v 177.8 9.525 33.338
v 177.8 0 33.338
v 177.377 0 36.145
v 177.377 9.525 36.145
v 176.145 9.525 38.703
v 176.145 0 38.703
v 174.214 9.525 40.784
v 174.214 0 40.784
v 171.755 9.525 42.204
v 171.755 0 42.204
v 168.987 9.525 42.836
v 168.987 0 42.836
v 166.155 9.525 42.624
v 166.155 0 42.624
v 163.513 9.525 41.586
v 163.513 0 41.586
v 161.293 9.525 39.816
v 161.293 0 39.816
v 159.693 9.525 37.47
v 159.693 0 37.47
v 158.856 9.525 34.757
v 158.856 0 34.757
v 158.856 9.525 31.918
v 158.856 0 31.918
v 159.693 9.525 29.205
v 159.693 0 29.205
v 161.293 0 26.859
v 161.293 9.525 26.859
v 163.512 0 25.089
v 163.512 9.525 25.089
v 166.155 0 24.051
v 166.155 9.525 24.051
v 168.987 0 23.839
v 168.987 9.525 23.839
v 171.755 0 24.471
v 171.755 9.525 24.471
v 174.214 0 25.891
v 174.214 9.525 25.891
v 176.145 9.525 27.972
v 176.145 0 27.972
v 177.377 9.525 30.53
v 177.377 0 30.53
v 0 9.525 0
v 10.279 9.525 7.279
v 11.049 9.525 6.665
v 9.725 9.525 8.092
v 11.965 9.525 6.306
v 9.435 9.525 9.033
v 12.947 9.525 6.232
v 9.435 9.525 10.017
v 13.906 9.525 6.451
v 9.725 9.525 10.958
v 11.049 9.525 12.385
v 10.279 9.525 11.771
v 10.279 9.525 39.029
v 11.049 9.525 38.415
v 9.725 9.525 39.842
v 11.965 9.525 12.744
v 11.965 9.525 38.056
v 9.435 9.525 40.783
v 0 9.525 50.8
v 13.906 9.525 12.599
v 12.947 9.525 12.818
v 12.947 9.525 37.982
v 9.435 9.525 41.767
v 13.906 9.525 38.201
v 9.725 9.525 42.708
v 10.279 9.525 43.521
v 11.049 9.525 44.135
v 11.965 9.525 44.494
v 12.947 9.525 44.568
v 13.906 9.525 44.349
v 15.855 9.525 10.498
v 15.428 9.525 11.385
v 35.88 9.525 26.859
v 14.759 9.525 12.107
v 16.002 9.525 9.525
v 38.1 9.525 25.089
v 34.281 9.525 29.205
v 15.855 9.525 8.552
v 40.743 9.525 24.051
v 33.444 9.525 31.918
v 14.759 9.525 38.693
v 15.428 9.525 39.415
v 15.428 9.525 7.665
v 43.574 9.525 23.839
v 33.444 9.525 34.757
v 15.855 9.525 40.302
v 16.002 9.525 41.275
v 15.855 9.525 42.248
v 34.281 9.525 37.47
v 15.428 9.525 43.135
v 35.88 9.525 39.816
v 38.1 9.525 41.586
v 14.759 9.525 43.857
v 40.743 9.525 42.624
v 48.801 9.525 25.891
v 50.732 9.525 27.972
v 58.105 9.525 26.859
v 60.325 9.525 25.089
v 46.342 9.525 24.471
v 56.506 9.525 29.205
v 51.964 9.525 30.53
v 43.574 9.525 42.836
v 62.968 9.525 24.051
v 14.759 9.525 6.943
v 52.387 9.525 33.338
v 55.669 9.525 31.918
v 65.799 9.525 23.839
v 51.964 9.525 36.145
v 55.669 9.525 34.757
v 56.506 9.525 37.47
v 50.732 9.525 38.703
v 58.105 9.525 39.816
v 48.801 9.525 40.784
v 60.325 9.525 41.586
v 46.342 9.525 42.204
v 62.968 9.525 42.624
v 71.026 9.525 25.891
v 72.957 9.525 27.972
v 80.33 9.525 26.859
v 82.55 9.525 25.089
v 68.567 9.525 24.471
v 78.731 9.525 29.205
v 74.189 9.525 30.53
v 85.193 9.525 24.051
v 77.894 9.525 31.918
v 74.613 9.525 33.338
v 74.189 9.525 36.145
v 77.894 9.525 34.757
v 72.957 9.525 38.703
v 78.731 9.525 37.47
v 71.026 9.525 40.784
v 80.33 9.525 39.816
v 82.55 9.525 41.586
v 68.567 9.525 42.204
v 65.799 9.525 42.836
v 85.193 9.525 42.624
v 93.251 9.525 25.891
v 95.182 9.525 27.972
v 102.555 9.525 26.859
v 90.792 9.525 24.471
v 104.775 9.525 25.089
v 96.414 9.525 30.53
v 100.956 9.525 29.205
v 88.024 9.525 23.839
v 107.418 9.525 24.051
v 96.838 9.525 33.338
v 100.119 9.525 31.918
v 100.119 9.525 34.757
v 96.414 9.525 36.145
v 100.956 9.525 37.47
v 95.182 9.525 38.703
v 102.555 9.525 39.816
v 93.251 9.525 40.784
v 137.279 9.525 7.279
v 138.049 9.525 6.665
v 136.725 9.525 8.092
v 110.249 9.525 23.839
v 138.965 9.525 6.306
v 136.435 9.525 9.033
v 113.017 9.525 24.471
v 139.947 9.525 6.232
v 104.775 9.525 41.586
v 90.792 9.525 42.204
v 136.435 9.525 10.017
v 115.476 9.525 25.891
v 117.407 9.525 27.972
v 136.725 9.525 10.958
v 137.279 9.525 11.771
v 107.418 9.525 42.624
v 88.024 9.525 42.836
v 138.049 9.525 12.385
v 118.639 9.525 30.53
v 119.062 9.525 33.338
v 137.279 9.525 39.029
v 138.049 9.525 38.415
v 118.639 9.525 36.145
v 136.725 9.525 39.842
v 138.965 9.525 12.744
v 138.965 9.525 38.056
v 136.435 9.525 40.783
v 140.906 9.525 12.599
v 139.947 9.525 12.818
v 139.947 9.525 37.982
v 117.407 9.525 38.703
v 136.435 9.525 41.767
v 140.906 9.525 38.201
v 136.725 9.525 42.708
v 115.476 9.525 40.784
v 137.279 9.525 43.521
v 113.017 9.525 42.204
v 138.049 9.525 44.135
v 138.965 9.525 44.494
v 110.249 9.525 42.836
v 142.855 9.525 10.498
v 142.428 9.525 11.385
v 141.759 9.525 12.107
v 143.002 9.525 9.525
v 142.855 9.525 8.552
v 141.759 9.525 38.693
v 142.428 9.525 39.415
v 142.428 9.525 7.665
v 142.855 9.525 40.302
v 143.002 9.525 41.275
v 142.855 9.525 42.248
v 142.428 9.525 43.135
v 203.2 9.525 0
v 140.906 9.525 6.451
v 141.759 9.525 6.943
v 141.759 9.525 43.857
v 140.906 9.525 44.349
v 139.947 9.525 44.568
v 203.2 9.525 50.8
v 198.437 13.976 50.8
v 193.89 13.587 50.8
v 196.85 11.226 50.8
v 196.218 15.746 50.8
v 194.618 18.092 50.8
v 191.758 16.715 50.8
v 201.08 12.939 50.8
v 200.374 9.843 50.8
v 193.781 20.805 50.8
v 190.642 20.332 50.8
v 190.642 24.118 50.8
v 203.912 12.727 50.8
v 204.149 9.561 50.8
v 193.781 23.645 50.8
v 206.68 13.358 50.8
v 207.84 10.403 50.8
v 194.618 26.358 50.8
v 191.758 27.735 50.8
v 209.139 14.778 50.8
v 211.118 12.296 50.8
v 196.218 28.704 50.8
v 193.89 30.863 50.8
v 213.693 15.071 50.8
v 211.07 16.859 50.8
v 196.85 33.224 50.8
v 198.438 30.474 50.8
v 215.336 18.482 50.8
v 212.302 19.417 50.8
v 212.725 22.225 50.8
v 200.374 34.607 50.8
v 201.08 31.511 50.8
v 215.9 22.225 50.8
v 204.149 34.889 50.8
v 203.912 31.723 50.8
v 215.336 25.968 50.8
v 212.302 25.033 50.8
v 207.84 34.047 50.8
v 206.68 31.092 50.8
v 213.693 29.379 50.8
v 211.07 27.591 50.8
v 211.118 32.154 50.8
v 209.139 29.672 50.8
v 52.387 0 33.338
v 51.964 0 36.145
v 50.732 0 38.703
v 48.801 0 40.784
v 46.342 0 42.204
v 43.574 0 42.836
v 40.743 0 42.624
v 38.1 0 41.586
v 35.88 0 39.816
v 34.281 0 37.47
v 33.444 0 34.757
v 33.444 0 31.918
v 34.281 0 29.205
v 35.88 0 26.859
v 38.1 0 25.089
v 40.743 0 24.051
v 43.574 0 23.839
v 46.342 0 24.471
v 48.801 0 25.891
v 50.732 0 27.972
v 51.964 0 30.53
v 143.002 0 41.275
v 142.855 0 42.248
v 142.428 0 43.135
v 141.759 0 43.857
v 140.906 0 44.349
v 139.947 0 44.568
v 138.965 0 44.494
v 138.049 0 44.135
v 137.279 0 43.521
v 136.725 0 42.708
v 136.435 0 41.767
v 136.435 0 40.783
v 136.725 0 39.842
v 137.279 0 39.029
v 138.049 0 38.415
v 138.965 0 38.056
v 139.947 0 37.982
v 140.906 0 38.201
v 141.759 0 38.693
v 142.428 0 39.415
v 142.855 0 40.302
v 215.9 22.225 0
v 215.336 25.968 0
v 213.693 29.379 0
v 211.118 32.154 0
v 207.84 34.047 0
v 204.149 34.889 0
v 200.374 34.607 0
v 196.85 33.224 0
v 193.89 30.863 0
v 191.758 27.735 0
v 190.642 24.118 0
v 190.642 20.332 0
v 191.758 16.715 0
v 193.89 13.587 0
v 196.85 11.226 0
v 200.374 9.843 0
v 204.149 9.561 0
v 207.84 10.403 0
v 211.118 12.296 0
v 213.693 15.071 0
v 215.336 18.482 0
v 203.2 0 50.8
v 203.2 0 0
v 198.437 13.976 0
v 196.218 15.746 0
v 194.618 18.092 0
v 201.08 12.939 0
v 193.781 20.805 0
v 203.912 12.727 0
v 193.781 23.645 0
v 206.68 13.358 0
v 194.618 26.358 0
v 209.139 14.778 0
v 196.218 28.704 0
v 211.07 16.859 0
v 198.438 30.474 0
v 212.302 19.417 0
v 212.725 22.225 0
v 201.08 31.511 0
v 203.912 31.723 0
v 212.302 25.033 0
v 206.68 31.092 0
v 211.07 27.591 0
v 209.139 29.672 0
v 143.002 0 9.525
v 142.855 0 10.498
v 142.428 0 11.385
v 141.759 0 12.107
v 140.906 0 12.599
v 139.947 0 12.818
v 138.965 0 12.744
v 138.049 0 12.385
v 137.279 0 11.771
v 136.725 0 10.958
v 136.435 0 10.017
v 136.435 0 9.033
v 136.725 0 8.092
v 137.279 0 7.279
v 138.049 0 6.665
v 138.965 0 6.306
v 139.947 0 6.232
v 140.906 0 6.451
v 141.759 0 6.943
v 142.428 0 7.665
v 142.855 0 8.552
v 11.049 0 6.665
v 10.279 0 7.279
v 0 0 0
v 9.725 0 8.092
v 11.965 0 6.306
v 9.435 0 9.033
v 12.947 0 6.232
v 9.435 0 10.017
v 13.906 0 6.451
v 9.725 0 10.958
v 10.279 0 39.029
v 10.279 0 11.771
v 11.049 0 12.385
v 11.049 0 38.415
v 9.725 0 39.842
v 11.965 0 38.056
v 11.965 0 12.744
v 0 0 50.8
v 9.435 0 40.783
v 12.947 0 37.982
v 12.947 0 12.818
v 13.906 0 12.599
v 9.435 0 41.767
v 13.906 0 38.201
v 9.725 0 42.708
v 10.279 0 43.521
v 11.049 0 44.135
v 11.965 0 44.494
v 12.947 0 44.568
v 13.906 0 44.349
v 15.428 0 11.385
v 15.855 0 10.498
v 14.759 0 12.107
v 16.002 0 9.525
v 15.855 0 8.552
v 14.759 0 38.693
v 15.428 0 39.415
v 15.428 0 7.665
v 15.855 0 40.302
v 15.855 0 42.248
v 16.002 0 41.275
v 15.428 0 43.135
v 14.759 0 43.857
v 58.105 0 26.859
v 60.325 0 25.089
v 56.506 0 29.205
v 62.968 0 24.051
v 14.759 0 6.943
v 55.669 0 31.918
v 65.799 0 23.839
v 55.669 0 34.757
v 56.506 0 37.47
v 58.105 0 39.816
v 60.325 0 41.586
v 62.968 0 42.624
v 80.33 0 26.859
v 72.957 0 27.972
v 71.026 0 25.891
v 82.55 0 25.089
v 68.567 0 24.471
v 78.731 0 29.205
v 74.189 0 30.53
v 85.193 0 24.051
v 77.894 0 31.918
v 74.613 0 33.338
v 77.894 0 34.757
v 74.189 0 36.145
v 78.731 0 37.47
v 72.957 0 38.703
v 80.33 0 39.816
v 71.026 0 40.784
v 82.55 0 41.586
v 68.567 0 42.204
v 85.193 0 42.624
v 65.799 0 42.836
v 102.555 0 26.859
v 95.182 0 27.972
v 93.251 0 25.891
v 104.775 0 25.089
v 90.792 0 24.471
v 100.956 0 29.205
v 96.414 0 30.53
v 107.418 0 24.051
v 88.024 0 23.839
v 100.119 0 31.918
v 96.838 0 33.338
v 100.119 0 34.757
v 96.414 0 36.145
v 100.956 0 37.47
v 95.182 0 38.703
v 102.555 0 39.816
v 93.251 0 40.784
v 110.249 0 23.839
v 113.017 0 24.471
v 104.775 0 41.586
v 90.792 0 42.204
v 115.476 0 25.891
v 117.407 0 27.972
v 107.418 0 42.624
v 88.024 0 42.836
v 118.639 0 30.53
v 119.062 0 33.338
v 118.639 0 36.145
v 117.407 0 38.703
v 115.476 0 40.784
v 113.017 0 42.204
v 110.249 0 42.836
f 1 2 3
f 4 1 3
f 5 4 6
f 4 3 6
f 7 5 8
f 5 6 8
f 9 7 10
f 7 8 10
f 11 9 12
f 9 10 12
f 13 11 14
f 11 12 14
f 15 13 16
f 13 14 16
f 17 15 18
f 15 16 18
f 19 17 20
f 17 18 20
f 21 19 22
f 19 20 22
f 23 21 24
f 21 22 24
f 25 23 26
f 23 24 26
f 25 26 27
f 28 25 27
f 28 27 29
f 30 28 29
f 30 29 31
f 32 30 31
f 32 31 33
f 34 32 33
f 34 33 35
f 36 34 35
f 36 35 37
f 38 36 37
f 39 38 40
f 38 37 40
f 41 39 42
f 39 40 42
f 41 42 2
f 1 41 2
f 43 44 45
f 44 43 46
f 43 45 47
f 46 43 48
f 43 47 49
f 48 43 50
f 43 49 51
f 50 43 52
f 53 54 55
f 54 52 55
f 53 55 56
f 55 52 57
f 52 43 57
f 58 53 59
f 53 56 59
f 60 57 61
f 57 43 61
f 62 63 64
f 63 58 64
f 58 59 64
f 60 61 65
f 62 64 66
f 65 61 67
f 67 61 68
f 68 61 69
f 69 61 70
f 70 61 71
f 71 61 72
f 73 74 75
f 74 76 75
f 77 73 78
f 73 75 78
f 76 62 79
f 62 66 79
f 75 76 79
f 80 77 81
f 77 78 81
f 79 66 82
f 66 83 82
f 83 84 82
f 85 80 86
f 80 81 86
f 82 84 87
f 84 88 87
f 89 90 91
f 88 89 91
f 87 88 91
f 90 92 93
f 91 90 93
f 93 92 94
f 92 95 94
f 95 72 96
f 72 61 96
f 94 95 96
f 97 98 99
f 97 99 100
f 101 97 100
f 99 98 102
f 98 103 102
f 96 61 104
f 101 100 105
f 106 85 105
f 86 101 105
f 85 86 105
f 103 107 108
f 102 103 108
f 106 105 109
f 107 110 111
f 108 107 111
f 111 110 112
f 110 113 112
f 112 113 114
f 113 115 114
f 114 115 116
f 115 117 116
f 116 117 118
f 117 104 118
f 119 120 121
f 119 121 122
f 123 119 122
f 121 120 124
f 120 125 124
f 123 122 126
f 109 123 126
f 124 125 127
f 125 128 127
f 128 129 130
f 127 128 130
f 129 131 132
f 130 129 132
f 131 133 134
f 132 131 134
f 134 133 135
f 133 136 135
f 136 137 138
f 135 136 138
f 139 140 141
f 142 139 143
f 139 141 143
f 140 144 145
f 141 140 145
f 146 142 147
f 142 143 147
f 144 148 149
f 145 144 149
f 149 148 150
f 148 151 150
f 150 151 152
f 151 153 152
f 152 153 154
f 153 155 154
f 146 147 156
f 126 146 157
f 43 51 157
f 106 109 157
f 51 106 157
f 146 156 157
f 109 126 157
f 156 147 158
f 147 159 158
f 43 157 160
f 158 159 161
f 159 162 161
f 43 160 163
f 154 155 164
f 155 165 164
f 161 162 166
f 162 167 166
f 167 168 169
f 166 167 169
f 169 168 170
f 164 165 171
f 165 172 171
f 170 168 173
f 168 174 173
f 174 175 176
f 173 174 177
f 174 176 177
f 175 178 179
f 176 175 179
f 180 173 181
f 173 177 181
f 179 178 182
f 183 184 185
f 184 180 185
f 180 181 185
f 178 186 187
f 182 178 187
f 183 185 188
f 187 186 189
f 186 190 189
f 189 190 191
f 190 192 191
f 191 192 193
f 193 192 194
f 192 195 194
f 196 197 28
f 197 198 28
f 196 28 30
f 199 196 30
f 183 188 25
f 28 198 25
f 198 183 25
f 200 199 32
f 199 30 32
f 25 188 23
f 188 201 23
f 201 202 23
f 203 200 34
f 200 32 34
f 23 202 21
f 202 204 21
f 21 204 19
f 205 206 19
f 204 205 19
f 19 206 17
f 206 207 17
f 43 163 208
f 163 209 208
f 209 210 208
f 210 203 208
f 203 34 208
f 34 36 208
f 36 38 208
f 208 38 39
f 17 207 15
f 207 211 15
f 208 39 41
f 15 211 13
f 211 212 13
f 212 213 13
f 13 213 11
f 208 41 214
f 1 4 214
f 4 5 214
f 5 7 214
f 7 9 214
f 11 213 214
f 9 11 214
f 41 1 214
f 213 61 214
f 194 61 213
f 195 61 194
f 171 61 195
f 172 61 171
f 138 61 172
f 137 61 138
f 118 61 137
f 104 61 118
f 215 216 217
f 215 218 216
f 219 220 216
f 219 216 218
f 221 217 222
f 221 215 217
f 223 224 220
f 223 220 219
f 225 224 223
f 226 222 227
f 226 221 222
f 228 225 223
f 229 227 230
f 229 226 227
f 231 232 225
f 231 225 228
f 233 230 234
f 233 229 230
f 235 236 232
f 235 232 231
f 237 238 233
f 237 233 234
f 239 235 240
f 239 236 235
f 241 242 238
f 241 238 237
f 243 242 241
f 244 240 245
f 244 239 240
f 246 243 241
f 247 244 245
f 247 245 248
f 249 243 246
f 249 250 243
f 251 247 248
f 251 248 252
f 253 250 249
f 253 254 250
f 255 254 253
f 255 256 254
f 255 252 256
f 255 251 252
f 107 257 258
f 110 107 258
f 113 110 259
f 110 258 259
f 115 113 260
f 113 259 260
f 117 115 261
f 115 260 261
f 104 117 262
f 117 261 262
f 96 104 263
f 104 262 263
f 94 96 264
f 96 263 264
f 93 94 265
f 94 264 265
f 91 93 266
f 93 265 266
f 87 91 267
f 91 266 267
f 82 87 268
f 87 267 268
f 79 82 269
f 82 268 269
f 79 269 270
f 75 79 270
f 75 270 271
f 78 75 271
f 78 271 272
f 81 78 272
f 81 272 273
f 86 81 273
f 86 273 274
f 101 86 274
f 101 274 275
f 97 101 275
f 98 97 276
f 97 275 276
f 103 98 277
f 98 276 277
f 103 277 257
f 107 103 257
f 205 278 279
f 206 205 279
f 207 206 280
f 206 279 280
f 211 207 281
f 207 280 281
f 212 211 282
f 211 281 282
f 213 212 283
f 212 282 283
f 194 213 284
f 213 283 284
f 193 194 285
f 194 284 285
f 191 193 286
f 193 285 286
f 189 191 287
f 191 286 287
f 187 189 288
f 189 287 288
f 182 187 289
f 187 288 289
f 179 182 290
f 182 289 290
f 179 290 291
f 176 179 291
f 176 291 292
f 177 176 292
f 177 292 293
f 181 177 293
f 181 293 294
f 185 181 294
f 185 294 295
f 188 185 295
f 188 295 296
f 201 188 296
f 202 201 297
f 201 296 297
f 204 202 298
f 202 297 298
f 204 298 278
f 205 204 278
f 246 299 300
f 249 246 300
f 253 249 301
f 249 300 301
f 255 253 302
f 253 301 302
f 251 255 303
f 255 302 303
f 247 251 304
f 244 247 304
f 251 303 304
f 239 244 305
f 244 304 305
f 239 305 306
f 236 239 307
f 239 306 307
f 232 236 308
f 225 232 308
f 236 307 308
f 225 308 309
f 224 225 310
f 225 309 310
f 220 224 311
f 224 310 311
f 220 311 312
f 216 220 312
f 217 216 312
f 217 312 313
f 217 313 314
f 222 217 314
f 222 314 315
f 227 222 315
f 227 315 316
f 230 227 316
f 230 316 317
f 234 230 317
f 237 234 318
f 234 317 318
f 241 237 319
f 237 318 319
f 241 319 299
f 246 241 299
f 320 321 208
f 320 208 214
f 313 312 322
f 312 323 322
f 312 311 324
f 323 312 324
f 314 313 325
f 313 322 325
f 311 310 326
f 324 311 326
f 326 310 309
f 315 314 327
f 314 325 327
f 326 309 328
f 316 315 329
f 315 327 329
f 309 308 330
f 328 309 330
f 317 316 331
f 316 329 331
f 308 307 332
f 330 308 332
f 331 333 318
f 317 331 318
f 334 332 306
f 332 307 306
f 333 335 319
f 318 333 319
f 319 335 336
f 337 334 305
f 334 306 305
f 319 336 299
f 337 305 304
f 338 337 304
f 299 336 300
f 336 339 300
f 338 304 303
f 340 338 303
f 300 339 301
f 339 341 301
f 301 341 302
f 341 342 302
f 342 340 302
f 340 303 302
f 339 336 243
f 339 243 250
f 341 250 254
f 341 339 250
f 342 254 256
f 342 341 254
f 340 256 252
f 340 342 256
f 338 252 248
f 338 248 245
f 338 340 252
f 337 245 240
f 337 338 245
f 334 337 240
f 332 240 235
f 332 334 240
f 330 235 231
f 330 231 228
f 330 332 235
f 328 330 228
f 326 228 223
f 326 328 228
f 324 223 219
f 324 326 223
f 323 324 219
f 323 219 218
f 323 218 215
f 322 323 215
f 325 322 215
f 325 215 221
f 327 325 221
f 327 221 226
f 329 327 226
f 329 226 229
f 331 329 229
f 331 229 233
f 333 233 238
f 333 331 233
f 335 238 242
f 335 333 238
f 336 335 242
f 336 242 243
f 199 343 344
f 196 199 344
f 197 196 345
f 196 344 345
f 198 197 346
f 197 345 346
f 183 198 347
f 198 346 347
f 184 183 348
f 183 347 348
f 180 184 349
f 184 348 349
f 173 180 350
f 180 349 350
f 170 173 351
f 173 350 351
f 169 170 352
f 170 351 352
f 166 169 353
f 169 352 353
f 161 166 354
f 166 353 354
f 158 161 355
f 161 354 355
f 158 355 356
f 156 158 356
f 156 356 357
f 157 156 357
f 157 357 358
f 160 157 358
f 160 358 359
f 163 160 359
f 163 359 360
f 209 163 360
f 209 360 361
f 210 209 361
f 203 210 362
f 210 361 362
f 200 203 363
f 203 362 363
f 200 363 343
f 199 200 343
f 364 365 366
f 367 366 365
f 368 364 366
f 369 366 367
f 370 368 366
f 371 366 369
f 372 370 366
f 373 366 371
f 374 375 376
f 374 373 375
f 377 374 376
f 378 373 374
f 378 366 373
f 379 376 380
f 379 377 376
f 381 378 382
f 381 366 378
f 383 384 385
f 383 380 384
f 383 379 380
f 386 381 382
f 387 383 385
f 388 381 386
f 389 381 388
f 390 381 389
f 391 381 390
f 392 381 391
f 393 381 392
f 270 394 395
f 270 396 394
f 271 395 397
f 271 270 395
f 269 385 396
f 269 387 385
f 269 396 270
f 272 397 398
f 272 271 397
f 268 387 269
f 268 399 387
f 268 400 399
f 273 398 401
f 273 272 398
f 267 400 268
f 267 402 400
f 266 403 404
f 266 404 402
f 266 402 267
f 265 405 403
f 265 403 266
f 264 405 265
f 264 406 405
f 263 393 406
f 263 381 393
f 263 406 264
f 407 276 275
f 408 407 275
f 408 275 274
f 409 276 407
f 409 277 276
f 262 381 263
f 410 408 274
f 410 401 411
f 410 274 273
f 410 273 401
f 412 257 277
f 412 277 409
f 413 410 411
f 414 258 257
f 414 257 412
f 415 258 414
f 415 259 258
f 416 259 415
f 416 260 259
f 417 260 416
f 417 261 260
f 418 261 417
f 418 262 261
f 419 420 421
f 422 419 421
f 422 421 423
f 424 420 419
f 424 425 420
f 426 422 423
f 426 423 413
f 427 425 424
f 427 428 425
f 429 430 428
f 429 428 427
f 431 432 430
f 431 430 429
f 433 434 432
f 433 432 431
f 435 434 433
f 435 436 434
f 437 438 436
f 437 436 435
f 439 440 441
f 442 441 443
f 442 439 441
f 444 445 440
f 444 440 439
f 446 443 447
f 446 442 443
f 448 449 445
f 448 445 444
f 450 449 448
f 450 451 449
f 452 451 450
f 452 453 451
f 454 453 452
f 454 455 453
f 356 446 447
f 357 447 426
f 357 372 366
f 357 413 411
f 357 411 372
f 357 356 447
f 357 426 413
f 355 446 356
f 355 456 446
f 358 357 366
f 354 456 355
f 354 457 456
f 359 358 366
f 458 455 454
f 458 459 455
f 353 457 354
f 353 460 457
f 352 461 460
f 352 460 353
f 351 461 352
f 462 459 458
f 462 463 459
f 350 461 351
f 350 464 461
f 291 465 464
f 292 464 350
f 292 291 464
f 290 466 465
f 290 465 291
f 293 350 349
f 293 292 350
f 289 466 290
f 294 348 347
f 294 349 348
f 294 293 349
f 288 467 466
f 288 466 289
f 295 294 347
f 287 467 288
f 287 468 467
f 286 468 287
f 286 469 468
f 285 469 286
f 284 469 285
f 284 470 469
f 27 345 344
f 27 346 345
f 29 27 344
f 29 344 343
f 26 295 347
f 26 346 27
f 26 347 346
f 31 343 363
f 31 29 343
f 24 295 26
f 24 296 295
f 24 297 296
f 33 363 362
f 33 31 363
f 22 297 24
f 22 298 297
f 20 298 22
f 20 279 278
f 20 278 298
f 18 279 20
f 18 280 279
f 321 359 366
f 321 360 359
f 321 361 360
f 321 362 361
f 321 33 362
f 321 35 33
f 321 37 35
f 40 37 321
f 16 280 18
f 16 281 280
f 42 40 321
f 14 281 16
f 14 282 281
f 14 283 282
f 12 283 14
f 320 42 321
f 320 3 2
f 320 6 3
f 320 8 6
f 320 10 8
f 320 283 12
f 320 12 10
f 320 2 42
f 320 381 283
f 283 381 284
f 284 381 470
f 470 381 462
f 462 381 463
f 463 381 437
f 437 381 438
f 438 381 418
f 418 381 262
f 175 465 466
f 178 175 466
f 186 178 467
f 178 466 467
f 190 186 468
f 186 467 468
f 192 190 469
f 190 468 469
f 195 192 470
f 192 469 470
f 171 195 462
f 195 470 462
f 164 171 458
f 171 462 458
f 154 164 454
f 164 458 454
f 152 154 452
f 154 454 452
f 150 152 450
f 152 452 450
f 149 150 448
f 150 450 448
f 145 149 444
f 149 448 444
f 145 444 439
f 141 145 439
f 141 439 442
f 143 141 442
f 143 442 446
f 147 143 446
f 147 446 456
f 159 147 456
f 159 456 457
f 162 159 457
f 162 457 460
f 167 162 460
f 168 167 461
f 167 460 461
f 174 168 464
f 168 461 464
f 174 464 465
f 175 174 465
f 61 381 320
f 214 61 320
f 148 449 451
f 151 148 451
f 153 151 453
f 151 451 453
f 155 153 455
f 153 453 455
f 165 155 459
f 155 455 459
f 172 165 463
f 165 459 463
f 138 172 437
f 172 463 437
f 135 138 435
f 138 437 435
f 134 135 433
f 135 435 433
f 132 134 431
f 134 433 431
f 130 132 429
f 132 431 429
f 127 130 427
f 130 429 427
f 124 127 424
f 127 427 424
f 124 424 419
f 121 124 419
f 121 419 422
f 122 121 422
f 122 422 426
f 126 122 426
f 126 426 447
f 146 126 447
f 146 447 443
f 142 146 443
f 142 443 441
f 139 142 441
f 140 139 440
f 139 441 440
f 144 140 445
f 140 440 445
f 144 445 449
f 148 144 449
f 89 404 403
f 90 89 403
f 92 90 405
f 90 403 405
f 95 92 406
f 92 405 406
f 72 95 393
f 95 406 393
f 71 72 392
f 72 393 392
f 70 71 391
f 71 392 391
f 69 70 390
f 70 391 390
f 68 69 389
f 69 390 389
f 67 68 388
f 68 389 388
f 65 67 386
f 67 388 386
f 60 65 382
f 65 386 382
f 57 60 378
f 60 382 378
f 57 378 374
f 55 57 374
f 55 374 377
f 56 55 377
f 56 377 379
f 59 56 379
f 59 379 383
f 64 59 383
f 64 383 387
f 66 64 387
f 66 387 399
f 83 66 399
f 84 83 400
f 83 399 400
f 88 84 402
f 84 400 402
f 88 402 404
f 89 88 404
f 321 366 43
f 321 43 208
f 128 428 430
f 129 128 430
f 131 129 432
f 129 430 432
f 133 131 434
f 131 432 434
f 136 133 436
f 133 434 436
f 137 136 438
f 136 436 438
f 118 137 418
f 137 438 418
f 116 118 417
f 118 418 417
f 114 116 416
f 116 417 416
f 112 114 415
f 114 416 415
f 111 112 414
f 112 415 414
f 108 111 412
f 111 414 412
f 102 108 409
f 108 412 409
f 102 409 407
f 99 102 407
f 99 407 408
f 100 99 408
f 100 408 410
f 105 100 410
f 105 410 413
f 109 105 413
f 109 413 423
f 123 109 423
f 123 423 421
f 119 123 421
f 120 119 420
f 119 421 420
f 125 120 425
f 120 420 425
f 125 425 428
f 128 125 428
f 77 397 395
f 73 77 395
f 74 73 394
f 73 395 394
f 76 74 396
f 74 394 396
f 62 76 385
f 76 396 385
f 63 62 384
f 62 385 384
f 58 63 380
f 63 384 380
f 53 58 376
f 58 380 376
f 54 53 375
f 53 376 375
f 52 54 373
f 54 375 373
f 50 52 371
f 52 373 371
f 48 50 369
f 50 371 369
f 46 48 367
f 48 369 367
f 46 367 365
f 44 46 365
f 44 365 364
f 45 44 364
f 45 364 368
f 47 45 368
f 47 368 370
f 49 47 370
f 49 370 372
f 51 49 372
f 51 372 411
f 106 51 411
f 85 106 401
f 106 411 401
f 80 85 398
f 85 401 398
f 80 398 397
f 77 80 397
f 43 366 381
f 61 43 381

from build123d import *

# Parameters (mm, degrees)
F0_W     = 203.2
F0_H     = 50.8
F0_R     = 3.302
F0_R_2   = 9.525
F1_DEPTH = 9.525
F2_R     = 12.7
F2_R_2   = 9.525
F3_DEPTH = 50.8


with BuildPart() as f1:
    # F0 (on Front) → F1 (new body)
    with BuildSketch(Plane.XZ):
        with Locations((101.6, 25.4)):
            Rectangle(F0_W, F0_H)
        with Locations((12.7, 9.525)):
            Circle(F0_R, mode=Mode.SUBTRACT)
        with Locations((139.7, 9.525)):
            Circle(F0_R, mode=Mode.SUBTRACT)
        with Locations((42.8625, 33.3375)):
            Circle(F0_R_2, mode=Mode.SUBTRACT)
        with Locations((65.0875, 33.3375)):
            Circle(F0_R_2, mode=Mode.SUBTRACT)
        with Locations((87.3125, 33.3375)):
            Circle(F0_R_2, mode=Mode.SUBTRACT)
        with Locations((12.7, 41.275)):
            Circle(F0_R, mode=Mode.SUBTRACT)
        with Locations((109.5375, 33.3375)):
            Circle(F0_R_2, mode=Mode.SUBTRACT)
        with Locations((168.275, 33.3375)):
            Circle(F0_R_2, mode=Mode.SUBTRACT)
        with Locations((139.7, 41.275)):
            Circle(F0_R, mode=Mode.SUBTRACT)
    extrude(amount=-F1_DEPTH)


with BuildPart() as f3:
    # F2 (on Top) → F3 (new body)
    with BuildSketch(Plane.XY):
        with Locations((203.2, 22.225)):
            Circle(F2_R)
        with Locations((203.2, 22.225)):
            Circle(F2_R_2, mode=Mode.SUBTRACT)
    extrude(amount=F3_DEPTH)


solid = Compound([f1.part, f3.part])
